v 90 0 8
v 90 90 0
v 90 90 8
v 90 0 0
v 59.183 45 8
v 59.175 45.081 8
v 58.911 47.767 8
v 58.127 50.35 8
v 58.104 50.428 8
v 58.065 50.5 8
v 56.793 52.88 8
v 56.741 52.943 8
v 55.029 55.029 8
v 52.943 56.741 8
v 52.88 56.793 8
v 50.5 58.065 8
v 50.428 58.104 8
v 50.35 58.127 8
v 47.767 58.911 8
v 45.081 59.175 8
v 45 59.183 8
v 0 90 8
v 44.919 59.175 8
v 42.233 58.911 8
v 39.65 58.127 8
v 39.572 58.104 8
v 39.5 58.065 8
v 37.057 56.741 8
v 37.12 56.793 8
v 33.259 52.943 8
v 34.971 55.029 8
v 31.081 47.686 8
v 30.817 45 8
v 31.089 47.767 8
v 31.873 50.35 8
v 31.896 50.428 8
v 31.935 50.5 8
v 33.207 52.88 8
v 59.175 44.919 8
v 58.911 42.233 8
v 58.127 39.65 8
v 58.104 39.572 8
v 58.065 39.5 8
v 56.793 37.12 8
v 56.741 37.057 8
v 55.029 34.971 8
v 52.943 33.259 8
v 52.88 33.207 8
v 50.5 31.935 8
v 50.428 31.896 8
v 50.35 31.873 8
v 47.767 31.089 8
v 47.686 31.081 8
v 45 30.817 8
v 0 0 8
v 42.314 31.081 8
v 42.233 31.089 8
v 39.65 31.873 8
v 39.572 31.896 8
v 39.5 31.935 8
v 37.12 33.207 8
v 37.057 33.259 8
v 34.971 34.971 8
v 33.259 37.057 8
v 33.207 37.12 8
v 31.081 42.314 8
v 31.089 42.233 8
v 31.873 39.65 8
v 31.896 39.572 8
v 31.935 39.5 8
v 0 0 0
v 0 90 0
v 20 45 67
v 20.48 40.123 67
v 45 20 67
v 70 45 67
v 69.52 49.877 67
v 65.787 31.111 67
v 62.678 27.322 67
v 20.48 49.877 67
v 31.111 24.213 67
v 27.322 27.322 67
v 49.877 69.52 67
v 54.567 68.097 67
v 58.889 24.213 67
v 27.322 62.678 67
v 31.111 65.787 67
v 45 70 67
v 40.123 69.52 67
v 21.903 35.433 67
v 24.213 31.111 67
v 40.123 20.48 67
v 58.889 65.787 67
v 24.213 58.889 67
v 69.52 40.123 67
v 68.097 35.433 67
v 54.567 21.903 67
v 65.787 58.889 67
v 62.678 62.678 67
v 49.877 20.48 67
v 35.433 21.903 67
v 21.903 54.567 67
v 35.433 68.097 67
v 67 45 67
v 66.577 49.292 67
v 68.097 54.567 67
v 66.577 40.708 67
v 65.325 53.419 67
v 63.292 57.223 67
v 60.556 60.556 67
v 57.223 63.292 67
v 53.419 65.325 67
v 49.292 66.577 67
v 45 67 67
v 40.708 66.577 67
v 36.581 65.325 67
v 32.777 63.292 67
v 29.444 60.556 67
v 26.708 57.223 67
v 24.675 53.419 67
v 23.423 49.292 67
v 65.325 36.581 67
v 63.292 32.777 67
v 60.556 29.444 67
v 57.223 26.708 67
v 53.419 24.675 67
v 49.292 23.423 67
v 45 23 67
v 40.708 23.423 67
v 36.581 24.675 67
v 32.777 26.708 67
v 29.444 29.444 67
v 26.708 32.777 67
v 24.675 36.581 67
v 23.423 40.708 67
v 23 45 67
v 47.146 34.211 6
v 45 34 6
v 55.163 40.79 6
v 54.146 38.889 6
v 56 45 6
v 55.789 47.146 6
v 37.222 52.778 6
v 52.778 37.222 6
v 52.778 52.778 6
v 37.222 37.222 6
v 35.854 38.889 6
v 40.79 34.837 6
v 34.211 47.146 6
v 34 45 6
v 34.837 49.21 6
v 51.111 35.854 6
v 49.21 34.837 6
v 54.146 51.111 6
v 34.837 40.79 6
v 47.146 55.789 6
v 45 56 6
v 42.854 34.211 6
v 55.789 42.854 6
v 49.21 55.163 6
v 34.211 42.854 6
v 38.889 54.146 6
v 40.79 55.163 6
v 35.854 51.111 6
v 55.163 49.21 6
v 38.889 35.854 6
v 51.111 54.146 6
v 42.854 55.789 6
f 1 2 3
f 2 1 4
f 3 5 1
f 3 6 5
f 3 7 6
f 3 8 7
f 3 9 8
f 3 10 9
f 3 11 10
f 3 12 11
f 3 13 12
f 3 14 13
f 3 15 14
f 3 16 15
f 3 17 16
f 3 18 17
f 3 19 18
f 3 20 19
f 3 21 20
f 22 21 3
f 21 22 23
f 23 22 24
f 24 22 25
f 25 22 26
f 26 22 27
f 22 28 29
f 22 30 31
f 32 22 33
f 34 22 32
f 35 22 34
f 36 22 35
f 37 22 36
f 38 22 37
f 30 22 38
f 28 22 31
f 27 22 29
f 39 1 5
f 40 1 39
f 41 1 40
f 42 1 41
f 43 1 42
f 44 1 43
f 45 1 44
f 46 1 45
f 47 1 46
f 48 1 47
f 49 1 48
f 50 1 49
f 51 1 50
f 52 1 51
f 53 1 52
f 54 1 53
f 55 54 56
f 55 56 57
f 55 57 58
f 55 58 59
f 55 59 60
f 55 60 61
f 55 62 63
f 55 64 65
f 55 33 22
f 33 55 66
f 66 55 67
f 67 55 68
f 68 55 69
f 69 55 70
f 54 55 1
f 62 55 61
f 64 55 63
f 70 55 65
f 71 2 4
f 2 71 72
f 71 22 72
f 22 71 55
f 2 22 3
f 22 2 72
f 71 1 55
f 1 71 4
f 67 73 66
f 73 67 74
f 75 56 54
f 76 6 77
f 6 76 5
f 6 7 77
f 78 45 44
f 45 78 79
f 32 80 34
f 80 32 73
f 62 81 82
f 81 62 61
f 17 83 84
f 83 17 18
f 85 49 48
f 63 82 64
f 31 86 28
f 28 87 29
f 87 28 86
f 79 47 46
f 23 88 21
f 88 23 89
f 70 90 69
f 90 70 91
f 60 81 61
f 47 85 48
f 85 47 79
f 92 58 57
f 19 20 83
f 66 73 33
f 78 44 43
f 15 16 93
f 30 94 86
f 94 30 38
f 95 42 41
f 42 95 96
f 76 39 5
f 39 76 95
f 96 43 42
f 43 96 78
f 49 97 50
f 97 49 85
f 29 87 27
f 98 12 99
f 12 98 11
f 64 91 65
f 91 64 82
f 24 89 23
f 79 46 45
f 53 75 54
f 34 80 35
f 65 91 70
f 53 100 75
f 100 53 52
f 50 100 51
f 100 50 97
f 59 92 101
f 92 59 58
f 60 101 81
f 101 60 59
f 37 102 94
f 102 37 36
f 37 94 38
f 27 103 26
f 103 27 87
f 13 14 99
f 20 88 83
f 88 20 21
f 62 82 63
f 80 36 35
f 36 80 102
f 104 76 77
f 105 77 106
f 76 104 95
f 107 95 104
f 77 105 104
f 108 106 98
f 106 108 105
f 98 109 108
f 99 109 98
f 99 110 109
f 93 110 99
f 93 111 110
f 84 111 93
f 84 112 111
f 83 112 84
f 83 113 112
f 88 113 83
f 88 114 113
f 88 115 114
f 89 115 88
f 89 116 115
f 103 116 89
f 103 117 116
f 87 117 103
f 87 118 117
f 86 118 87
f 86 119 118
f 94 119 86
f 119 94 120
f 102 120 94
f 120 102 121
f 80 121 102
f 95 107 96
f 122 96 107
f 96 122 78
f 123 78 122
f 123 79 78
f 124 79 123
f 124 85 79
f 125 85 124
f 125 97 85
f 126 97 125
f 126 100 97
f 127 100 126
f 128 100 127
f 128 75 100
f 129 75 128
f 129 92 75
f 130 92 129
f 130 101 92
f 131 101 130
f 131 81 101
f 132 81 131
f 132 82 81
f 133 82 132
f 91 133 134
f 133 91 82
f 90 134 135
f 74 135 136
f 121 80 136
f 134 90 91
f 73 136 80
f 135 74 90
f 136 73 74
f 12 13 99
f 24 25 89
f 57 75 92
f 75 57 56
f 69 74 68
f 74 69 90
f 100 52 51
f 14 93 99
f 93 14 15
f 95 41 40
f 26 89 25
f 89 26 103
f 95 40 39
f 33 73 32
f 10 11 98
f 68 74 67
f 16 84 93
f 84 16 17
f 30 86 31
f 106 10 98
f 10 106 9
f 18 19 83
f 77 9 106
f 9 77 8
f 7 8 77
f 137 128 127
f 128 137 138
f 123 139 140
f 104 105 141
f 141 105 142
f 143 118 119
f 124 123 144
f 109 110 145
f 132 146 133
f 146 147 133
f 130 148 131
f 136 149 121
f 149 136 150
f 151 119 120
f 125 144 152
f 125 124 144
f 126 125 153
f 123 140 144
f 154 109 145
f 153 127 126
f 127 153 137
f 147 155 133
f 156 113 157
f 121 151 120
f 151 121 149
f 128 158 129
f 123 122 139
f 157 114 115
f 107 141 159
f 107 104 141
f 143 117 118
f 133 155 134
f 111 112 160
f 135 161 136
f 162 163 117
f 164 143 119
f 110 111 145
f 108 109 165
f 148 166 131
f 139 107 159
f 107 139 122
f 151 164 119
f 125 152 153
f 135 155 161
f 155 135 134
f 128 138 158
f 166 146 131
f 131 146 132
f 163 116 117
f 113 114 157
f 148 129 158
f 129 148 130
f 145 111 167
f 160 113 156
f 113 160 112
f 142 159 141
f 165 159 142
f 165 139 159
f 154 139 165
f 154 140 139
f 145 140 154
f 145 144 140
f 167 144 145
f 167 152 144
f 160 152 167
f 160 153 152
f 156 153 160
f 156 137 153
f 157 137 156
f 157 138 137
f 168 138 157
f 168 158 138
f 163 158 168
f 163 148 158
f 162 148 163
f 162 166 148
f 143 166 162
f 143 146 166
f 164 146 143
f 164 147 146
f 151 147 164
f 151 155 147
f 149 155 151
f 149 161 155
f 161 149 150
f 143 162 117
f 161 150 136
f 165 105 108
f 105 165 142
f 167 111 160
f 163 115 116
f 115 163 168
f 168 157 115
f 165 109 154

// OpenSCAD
$fn = 32;

// ----------------------------------------------------------------------
// Hopper: funnel with square flange
// ----------------------------------------------------------------------

// --- parameters (mm) ---
fl = 90;                  // flange side, X and Y
fl_t = 8;                 // flange thickness
cone_h = 60;              // cone height above the flange
top_d = 50;               // cone mouth diameter
bot_d = 28;               // cone spout diameter
wall = 3;                 // cone wall thickness
fit_tol = 0.1;            // tolerance for press fits, mm
free_tol = 0.3;           // tolerance for clearance fits, mm

bore_d = bot_d - 2 * wall;  // spout bore diameter
total_h = fl_t + cone_h - 1;  // overall height

difference() {
  union() {
    cube([fl, fl, fl_t]);
    translate([fl / 2, fl / 2, fl_t - 1])
      cylinder(h = cone_h, d1 = bot_d, d2 = top_d);
  }
  translate([fl / 2, fl / 2, fl_t - 2])
    cylinder(h = cone_h + 1, d1 = bore_d, d2 = top_d - 2 * wall);
}
